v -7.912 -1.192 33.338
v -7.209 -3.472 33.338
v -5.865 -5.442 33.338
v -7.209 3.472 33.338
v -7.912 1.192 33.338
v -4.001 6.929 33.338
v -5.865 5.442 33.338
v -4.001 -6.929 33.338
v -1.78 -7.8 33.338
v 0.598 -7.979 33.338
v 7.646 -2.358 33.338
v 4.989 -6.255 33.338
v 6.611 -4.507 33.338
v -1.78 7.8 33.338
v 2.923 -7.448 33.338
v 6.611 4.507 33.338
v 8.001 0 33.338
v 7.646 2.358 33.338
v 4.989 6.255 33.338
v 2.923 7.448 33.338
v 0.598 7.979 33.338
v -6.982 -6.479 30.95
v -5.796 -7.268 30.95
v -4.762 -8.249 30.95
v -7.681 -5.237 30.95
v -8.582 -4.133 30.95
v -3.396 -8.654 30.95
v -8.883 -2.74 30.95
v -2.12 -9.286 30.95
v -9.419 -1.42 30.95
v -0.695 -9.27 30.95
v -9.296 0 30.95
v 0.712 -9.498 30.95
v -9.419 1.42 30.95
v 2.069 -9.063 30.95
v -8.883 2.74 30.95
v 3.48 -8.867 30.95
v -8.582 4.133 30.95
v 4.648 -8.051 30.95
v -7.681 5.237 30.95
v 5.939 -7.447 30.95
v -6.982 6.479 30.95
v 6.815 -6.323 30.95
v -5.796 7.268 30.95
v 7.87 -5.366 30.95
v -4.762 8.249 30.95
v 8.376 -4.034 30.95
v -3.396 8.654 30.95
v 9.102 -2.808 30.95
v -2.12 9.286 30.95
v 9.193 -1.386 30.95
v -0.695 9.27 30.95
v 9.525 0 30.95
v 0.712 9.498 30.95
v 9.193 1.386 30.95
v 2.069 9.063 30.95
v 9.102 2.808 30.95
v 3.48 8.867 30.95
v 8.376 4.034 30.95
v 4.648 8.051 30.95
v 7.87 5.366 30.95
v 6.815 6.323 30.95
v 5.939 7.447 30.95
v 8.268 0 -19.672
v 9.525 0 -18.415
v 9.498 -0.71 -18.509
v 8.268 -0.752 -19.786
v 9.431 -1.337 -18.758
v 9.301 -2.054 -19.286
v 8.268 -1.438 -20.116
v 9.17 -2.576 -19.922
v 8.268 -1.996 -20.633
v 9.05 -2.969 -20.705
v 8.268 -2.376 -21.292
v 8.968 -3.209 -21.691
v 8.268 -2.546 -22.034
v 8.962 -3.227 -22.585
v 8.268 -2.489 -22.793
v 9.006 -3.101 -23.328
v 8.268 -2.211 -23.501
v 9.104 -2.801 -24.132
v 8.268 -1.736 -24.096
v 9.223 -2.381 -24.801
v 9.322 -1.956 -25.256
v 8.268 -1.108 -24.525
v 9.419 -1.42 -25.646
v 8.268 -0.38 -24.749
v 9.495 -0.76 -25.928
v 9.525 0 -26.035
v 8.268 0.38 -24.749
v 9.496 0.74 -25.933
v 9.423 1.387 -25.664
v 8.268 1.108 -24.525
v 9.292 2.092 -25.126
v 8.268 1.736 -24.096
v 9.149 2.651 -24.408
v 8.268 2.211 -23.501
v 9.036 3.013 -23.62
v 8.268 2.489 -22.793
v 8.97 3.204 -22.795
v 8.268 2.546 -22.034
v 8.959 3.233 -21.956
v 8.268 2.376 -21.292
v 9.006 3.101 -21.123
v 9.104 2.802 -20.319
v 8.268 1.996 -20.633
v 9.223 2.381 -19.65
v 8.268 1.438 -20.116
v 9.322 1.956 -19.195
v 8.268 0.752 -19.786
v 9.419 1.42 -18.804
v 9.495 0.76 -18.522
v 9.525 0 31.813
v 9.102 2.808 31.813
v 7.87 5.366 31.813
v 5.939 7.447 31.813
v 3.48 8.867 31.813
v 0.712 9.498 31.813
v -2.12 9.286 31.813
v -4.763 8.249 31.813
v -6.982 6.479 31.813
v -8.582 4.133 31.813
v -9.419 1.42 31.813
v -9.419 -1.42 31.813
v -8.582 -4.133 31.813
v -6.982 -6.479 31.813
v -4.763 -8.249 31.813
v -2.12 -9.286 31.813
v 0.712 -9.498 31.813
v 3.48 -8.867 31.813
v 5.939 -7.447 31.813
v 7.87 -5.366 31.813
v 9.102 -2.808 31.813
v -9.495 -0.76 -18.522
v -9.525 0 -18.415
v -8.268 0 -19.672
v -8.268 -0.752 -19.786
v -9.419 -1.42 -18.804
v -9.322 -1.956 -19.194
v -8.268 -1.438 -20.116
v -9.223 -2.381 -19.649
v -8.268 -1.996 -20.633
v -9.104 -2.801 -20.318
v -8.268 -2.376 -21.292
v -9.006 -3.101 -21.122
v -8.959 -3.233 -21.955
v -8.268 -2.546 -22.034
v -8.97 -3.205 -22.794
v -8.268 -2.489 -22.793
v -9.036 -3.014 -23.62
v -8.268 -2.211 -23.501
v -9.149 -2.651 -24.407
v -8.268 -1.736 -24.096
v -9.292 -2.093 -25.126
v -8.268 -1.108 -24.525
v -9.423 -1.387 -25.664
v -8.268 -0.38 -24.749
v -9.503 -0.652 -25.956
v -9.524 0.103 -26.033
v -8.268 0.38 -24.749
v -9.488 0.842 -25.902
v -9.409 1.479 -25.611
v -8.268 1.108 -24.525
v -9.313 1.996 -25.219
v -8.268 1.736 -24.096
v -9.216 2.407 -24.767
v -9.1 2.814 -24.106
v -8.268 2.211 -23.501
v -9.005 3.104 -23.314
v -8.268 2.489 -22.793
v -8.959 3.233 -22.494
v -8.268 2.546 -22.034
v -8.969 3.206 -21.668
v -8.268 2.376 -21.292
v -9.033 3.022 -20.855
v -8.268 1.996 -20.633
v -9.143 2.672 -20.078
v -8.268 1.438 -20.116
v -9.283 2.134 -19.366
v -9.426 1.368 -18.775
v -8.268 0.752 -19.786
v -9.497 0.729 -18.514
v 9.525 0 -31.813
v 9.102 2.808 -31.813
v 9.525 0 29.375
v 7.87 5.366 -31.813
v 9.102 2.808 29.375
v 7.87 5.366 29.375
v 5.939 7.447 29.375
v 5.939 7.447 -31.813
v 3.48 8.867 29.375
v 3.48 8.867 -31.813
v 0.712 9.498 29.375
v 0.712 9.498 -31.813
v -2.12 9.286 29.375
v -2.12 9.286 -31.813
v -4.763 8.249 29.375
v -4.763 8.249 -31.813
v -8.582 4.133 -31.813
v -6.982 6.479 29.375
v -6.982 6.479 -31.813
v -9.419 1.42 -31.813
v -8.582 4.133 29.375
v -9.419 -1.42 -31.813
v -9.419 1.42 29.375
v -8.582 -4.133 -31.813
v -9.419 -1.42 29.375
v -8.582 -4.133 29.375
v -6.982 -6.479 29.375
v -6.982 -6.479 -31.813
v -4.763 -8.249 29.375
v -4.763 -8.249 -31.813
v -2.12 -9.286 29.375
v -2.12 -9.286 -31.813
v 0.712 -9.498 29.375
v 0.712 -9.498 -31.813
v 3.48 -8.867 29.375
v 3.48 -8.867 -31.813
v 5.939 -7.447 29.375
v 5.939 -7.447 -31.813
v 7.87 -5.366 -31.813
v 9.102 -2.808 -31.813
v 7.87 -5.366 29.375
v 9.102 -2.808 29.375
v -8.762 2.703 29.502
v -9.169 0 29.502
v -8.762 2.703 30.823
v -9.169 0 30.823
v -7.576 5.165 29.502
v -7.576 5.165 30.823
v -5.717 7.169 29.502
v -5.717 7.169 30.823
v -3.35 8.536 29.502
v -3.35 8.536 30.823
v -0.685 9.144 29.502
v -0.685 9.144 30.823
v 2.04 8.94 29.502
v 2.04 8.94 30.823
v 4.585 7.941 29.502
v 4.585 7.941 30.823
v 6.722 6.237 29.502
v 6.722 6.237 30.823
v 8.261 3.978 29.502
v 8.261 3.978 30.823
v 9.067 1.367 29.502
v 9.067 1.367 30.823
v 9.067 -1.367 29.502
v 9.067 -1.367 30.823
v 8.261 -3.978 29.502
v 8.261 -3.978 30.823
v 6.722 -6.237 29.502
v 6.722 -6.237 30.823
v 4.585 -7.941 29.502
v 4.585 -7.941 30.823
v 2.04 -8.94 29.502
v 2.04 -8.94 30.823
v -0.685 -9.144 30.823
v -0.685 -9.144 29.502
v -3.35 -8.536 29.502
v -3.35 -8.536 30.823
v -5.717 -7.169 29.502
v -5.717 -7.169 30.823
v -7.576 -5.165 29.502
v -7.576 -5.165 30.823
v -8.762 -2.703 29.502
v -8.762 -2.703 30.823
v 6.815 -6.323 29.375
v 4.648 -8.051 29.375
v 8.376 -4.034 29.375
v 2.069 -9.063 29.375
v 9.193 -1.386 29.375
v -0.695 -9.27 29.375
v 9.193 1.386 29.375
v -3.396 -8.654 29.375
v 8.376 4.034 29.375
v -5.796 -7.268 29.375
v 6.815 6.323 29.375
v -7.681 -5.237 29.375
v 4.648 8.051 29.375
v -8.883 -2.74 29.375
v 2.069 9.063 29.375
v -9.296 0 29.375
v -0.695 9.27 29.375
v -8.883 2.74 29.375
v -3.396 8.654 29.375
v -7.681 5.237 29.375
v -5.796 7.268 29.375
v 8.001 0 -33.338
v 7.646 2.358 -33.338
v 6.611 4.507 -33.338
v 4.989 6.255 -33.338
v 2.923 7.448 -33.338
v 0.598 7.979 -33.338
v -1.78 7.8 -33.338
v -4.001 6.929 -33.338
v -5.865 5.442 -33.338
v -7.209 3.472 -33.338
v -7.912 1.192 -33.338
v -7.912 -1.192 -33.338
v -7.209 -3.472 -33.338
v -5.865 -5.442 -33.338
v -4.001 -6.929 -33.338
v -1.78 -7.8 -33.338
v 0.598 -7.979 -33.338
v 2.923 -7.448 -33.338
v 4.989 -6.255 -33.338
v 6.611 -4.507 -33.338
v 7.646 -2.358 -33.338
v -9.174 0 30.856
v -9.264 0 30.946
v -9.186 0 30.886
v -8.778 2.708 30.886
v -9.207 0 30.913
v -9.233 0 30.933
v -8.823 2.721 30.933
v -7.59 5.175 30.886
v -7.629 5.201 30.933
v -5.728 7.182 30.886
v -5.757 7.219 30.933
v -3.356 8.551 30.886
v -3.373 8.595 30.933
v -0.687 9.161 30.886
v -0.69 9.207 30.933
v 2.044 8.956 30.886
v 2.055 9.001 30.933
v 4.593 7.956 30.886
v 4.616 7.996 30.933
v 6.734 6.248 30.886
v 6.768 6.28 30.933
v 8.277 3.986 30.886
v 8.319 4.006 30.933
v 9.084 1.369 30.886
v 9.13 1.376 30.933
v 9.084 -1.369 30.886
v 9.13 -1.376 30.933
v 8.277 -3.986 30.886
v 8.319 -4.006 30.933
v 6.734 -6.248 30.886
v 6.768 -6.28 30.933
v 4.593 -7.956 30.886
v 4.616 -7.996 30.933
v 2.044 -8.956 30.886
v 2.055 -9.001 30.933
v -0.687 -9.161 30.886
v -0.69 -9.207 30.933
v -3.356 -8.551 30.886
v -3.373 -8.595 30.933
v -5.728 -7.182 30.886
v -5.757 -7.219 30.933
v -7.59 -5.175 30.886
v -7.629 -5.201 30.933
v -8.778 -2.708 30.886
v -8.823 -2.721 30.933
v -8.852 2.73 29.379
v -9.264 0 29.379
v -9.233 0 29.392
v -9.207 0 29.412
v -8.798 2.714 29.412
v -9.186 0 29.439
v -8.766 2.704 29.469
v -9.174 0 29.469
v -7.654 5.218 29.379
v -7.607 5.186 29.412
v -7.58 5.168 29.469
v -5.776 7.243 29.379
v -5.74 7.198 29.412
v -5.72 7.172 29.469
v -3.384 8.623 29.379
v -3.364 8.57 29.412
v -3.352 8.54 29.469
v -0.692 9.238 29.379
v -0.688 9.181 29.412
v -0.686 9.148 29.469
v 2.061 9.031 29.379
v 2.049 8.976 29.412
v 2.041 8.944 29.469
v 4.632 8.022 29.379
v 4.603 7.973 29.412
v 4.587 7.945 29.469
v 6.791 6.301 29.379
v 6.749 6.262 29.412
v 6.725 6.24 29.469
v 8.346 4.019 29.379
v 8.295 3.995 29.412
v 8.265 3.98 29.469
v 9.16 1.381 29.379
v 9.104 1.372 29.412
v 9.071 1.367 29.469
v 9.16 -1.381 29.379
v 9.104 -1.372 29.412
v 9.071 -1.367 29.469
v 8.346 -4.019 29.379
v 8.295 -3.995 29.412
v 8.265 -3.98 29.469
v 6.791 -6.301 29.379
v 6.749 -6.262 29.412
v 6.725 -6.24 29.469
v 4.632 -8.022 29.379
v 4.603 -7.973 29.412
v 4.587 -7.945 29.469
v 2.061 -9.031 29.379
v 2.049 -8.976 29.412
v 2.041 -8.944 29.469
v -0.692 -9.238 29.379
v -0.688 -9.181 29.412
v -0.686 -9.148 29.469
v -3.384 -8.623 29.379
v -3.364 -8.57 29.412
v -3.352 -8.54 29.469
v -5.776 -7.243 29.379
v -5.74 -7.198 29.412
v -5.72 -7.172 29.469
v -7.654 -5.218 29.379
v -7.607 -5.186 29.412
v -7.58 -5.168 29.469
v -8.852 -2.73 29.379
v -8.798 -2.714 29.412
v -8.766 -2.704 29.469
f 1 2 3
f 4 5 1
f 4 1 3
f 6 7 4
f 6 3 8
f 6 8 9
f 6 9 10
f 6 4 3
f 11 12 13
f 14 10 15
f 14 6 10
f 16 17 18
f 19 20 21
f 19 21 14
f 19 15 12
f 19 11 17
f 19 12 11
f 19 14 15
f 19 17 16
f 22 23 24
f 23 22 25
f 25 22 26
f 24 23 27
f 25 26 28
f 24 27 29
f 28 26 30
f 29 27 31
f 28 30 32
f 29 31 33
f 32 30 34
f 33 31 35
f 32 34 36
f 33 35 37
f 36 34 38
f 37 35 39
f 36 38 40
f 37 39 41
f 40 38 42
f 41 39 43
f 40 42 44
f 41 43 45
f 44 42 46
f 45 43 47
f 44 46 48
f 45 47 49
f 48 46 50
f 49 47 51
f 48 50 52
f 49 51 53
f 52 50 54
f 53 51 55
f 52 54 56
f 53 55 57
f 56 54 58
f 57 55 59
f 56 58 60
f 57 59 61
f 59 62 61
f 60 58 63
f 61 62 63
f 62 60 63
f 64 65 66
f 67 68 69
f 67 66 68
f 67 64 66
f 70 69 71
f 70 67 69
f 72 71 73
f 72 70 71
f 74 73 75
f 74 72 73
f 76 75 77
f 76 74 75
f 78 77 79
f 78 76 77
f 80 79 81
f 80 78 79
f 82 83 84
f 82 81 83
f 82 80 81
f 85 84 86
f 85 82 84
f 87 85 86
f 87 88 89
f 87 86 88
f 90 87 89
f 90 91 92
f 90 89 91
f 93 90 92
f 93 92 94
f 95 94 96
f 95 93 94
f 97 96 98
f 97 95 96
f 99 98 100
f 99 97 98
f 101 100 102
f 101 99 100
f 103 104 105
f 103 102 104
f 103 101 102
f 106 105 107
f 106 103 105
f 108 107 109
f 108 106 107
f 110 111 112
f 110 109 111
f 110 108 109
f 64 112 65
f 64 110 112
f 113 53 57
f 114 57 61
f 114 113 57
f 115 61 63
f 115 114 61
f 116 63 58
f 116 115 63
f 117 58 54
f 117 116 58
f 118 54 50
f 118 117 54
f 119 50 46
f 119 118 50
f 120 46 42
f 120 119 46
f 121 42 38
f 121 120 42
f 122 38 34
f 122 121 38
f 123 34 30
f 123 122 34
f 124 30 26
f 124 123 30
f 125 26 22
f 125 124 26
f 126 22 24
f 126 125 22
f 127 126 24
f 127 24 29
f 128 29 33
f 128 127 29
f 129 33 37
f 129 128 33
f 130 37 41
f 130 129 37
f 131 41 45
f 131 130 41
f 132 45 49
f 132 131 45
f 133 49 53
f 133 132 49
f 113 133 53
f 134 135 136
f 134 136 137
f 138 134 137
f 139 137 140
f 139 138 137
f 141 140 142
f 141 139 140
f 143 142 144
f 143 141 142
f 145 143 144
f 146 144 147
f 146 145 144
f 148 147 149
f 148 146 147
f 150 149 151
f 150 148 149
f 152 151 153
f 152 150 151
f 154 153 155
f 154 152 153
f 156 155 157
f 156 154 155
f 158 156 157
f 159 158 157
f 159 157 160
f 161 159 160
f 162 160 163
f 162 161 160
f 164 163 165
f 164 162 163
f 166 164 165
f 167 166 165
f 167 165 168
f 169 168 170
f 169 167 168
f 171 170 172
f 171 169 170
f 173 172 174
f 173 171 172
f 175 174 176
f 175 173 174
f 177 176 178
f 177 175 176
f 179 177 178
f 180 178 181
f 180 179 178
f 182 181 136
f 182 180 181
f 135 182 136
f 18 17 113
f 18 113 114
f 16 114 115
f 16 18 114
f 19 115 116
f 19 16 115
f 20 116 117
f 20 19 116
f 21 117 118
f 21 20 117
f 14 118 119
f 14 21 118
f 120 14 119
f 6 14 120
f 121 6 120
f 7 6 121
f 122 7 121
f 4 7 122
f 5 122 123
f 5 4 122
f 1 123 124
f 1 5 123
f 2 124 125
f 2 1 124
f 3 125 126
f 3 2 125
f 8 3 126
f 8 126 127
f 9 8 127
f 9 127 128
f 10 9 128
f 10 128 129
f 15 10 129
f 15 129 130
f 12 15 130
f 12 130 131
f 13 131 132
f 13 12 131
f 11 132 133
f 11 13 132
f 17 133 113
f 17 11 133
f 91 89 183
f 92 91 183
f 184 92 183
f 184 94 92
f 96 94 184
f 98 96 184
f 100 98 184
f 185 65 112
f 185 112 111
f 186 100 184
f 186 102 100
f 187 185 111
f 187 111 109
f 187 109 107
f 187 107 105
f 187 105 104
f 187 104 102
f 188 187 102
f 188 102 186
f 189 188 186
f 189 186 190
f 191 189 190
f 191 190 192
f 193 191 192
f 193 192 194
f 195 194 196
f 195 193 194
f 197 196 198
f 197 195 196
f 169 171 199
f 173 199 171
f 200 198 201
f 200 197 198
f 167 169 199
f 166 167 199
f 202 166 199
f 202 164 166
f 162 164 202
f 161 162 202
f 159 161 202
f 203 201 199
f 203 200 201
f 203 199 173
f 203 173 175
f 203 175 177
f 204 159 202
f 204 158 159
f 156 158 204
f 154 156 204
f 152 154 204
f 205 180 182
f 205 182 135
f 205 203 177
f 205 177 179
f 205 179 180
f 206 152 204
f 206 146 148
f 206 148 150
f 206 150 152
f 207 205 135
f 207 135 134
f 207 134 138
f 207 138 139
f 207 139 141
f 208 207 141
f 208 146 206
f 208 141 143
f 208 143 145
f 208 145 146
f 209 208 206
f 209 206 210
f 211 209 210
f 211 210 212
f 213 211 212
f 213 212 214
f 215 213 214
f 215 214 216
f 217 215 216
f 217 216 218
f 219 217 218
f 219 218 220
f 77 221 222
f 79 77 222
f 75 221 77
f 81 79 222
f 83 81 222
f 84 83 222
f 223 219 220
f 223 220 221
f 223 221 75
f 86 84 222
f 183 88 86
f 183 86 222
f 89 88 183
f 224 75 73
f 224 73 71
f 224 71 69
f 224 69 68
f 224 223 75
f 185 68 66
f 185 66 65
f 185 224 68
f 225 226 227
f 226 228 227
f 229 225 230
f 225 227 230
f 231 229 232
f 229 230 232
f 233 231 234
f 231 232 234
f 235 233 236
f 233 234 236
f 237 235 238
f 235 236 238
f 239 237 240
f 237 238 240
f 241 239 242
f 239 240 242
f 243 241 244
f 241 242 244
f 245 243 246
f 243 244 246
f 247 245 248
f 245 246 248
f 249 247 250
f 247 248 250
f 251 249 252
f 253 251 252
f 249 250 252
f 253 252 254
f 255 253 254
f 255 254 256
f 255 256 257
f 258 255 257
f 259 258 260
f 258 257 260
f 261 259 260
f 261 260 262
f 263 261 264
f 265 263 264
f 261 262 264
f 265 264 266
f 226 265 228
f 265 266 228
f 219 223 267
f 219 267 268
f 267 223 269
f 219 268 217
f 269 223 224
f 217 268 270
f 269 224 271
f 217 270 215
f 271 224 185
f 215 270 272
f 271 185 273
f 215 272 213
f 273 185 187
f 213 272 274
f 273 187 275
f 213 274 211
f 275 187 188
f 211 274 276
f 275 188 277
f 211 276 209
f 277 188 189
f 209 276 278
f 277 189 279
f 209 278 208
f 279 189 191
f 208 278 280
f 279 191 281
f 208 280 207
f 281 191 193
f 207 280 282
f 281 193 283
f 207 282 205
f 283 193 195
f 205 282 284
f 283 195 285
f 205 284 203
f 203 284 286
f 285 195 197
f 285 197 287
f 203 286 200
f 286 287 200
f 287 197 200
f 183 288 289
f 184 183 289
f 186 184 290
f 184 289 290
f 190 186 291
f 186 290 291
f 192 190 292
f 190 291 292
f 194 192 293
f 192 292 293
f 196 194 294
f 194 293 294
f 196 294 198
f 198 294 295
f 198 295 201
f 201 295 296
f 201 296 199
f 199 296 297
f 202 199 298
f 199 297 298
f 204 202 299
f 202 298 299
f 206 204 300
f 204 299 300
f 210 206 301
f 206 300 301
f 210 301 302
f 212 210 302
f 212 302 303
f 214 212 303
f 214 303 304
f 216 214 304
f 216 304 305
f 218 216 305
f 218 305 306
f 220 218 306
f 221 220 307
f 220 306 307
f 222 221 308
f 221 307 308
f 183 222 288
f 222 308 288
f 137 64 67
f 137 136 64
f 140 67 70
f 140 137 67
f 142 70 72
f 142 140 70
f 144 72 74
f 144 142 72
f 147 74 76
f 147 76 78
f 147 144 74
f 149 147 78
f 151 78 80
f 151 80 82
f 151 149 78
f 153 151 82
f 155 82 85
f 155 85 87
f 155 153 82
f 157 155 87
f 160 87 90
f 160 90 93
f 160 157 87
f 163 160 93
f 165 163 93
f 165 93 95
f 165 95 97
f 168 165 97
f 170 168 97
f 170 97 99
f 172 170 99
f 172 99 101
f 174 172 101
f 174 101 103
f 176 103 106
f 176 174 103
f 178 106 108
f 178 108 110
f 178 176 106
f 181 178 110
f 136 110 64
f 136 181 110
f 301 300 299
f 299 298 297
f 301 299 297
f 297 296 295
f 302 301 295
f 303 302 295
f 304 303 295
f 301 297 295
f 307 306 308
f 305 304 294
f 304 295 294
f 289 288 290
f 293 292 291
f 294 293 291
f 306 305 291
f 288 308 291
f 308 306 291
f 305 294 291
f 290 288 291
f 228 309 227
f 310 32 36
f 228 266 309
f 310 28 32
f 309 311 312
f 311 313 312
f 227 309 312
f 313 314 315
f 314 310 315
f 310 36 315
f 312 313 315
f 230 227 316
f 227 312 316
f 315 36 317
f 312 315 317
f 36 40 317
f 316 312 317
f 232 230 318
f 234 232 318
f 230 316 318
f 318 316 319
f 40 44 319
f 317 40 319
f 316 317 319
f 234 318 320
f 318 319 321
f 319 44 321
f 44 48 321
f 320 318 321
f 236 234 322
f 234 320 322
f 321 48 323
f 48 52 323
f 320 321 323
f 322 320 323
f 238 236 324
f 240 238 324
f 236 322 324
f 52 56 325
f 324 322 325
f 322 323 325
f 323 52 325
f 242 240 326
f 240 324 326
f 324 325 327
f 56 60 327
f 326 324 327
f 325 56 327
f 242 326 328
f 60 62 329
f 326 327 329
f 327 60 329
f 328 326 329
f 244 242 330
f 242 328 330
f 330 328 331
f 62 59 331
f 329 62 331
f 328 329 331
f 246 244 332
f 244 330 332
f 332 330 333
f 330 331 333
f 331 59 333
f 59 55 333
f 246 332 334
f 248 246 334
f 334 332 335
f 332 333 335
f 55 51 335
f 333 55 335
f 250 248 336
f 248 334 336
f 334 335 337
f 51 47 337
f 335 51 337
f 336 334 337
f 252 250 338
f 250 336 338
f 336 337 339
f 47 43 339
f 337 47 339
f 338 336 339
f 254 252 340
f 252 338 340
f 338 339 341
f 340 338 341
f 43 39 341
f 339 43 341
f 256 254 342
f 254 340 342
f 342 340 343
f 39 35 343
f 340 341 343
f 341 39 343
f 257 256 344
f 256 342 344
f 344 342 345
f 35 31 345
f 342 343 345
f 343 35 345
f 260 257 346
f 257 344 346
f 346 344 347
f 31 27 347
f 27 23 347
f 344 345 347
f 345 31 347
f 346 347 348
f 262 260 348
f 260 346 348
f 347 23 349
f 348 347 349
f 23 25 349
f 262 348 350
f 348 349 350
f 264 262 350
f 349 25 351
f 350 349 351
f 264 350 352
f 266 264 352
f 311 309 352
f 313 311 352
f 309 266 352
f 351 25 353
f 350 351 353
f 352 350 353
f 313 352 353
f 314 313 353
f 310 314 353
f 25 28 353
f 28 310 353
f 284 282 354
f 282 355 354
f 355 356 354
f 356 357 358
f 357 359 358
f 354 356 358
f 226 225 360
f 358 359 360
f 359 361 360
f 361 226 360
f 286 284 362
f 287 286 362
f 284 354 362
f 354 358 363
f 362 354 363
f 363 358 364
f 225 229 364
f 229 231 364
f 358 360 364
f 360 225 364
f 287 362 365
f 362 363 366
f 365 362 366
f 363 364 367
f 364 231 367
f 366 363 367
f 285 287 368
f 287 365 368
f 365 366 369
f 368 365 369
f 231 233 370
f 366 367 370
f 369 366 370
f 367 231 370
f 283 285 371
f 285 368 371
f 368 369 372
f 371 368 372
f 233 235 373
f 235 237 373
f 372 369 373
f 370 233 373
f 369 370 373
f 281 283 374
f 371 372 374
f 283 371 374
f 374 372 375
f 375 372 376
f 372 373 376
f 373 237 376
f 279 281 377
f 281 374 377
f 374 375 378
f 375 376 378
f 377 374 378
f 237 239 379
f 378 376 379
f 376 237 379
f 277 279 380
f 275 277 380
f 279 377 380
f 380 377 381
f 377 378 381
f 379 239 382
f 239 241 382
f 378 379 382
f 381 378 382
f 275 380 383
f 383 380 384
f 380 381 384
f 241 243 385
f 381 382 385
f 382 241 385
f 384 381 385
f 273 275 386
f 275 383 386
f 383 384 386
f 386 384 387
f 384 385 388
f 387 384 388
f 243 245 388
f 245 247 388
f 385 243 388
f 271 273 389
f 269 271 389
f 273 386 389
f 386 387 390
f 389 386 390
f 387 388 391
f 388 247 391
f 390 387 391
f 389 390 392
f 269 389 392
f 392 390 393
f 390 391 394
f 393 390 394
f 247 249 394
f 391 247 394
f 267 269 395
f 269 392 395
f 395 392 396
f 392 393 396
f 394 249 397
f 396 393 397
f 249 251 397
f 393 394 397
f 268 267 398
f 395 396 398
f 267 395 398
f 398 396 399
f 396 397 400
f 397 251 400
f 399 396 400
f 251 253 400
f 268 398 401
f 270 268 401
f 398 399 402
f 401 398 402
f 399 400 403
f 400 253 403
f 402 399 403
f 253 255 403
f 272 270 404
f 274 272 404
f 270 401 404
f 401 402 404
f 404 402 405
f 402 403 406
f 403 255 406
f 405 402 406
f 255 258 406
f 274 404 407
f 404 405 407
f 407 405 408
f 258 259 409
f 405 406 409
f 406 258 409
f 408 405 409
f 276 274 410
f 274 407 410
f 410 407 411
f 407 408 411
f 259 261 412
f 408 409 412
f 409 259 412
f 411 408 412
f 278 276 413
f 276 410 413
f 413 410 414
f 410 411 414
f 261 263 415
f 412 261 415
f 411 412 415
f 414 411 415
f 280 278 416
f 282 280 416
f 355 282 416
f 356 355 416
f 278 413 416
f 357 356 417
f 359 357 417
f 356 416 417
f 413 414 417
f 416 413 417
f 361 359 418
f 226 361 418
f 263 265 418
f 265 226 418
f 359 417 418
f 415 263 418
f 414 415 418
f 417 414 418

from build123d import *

# Parameters (mm, degrees)
SKETCH1_R           = 9.525
BOSS_EXTRUDE1_DEPTH = 33.3375
CHAMFER1_SIZE       = 1.524


with BuildPart() as part:
    # Sketch1 → Boss-Extrude1 (new, symmetric)
    with BuildSketch(Plane.XY):
        Circle(SKETCH1_R)
    extrude(amount=BOSS_EXTRUDE1_DEPTH, both=True)

    # Chamfer1
    chamfer1_edges = [part.edges().sort_by_distance(p)[0] for p in [
        (-9.525, 0, -33.3375),
        (-9.525, 0, 33.3375),
    ]]
    chamfer(chamfer1_edges, length=CHAMFER1_SIZE)

    # Sketch3 → 1/4-20 Tapped Hole1 (revolve, cut)
    with BuildSketch(Plane(origin=(-9.525, 0, -22.225), x_dir=(0, 0, 1), z_dir=(0, 1, 0))):
        Polygon((0, 0), (0, 19.05), (3.81, 19.05), (2.5527, 17.7927), (2.5527, 1.2573), (3.81, 0), align=None)
    revolve(axis=Axis((-15.875, 0, -22.225), (1, 0, 0)), mode=Mode.SUBTRACT)

    # Groove Sketch → Retaining Ring Groove (revolve, cut)
    with BuildSketch(Plane(origin=(9.513189126, 2.614578126, 39.123243658), x_dir=(-0.3010163797724101, -0.08273049466574514, 0.9500235809500064), z_dir=(0.26501052487715226, -0.9642455194110764, 0)), mode=Mode.PRIVATE) as retaining_ring_groove_sk:
        with BuildLine():
            Line((-1.782805189, 20.756214823), (-1.711441265, 20.973390213))
            Line((-1.711441265, 20.973390213), (-3.2075384, 21.46500836))
            Line((-3.2075384, 21.46500836), (-3.278902324, 21.247832969))
            ThreePointArc((-3.278902324, 21.247832969), (-3.271598278, 21.150906191), (-3.197895954, 21.08753335))
            Line((-3.197895954, 21.08753335), (-1.943104809, 20.675208453))
            ThreePointArc((-1.943104809, 20.675208453), (-1.84617803, 20.682512499), (-1.782805189, 20.756214823))
        make_face()
    revolve(retaining_ring_groove_sk.sketch.rotate(Axis((0, 0, 54.757401128), (0, 0, -1)), 15.367578188), axis=Axis((0, 0, 54.757401128), (0, 0, -1)), mode=Mode.SUBTRACT)


solid = part.part
